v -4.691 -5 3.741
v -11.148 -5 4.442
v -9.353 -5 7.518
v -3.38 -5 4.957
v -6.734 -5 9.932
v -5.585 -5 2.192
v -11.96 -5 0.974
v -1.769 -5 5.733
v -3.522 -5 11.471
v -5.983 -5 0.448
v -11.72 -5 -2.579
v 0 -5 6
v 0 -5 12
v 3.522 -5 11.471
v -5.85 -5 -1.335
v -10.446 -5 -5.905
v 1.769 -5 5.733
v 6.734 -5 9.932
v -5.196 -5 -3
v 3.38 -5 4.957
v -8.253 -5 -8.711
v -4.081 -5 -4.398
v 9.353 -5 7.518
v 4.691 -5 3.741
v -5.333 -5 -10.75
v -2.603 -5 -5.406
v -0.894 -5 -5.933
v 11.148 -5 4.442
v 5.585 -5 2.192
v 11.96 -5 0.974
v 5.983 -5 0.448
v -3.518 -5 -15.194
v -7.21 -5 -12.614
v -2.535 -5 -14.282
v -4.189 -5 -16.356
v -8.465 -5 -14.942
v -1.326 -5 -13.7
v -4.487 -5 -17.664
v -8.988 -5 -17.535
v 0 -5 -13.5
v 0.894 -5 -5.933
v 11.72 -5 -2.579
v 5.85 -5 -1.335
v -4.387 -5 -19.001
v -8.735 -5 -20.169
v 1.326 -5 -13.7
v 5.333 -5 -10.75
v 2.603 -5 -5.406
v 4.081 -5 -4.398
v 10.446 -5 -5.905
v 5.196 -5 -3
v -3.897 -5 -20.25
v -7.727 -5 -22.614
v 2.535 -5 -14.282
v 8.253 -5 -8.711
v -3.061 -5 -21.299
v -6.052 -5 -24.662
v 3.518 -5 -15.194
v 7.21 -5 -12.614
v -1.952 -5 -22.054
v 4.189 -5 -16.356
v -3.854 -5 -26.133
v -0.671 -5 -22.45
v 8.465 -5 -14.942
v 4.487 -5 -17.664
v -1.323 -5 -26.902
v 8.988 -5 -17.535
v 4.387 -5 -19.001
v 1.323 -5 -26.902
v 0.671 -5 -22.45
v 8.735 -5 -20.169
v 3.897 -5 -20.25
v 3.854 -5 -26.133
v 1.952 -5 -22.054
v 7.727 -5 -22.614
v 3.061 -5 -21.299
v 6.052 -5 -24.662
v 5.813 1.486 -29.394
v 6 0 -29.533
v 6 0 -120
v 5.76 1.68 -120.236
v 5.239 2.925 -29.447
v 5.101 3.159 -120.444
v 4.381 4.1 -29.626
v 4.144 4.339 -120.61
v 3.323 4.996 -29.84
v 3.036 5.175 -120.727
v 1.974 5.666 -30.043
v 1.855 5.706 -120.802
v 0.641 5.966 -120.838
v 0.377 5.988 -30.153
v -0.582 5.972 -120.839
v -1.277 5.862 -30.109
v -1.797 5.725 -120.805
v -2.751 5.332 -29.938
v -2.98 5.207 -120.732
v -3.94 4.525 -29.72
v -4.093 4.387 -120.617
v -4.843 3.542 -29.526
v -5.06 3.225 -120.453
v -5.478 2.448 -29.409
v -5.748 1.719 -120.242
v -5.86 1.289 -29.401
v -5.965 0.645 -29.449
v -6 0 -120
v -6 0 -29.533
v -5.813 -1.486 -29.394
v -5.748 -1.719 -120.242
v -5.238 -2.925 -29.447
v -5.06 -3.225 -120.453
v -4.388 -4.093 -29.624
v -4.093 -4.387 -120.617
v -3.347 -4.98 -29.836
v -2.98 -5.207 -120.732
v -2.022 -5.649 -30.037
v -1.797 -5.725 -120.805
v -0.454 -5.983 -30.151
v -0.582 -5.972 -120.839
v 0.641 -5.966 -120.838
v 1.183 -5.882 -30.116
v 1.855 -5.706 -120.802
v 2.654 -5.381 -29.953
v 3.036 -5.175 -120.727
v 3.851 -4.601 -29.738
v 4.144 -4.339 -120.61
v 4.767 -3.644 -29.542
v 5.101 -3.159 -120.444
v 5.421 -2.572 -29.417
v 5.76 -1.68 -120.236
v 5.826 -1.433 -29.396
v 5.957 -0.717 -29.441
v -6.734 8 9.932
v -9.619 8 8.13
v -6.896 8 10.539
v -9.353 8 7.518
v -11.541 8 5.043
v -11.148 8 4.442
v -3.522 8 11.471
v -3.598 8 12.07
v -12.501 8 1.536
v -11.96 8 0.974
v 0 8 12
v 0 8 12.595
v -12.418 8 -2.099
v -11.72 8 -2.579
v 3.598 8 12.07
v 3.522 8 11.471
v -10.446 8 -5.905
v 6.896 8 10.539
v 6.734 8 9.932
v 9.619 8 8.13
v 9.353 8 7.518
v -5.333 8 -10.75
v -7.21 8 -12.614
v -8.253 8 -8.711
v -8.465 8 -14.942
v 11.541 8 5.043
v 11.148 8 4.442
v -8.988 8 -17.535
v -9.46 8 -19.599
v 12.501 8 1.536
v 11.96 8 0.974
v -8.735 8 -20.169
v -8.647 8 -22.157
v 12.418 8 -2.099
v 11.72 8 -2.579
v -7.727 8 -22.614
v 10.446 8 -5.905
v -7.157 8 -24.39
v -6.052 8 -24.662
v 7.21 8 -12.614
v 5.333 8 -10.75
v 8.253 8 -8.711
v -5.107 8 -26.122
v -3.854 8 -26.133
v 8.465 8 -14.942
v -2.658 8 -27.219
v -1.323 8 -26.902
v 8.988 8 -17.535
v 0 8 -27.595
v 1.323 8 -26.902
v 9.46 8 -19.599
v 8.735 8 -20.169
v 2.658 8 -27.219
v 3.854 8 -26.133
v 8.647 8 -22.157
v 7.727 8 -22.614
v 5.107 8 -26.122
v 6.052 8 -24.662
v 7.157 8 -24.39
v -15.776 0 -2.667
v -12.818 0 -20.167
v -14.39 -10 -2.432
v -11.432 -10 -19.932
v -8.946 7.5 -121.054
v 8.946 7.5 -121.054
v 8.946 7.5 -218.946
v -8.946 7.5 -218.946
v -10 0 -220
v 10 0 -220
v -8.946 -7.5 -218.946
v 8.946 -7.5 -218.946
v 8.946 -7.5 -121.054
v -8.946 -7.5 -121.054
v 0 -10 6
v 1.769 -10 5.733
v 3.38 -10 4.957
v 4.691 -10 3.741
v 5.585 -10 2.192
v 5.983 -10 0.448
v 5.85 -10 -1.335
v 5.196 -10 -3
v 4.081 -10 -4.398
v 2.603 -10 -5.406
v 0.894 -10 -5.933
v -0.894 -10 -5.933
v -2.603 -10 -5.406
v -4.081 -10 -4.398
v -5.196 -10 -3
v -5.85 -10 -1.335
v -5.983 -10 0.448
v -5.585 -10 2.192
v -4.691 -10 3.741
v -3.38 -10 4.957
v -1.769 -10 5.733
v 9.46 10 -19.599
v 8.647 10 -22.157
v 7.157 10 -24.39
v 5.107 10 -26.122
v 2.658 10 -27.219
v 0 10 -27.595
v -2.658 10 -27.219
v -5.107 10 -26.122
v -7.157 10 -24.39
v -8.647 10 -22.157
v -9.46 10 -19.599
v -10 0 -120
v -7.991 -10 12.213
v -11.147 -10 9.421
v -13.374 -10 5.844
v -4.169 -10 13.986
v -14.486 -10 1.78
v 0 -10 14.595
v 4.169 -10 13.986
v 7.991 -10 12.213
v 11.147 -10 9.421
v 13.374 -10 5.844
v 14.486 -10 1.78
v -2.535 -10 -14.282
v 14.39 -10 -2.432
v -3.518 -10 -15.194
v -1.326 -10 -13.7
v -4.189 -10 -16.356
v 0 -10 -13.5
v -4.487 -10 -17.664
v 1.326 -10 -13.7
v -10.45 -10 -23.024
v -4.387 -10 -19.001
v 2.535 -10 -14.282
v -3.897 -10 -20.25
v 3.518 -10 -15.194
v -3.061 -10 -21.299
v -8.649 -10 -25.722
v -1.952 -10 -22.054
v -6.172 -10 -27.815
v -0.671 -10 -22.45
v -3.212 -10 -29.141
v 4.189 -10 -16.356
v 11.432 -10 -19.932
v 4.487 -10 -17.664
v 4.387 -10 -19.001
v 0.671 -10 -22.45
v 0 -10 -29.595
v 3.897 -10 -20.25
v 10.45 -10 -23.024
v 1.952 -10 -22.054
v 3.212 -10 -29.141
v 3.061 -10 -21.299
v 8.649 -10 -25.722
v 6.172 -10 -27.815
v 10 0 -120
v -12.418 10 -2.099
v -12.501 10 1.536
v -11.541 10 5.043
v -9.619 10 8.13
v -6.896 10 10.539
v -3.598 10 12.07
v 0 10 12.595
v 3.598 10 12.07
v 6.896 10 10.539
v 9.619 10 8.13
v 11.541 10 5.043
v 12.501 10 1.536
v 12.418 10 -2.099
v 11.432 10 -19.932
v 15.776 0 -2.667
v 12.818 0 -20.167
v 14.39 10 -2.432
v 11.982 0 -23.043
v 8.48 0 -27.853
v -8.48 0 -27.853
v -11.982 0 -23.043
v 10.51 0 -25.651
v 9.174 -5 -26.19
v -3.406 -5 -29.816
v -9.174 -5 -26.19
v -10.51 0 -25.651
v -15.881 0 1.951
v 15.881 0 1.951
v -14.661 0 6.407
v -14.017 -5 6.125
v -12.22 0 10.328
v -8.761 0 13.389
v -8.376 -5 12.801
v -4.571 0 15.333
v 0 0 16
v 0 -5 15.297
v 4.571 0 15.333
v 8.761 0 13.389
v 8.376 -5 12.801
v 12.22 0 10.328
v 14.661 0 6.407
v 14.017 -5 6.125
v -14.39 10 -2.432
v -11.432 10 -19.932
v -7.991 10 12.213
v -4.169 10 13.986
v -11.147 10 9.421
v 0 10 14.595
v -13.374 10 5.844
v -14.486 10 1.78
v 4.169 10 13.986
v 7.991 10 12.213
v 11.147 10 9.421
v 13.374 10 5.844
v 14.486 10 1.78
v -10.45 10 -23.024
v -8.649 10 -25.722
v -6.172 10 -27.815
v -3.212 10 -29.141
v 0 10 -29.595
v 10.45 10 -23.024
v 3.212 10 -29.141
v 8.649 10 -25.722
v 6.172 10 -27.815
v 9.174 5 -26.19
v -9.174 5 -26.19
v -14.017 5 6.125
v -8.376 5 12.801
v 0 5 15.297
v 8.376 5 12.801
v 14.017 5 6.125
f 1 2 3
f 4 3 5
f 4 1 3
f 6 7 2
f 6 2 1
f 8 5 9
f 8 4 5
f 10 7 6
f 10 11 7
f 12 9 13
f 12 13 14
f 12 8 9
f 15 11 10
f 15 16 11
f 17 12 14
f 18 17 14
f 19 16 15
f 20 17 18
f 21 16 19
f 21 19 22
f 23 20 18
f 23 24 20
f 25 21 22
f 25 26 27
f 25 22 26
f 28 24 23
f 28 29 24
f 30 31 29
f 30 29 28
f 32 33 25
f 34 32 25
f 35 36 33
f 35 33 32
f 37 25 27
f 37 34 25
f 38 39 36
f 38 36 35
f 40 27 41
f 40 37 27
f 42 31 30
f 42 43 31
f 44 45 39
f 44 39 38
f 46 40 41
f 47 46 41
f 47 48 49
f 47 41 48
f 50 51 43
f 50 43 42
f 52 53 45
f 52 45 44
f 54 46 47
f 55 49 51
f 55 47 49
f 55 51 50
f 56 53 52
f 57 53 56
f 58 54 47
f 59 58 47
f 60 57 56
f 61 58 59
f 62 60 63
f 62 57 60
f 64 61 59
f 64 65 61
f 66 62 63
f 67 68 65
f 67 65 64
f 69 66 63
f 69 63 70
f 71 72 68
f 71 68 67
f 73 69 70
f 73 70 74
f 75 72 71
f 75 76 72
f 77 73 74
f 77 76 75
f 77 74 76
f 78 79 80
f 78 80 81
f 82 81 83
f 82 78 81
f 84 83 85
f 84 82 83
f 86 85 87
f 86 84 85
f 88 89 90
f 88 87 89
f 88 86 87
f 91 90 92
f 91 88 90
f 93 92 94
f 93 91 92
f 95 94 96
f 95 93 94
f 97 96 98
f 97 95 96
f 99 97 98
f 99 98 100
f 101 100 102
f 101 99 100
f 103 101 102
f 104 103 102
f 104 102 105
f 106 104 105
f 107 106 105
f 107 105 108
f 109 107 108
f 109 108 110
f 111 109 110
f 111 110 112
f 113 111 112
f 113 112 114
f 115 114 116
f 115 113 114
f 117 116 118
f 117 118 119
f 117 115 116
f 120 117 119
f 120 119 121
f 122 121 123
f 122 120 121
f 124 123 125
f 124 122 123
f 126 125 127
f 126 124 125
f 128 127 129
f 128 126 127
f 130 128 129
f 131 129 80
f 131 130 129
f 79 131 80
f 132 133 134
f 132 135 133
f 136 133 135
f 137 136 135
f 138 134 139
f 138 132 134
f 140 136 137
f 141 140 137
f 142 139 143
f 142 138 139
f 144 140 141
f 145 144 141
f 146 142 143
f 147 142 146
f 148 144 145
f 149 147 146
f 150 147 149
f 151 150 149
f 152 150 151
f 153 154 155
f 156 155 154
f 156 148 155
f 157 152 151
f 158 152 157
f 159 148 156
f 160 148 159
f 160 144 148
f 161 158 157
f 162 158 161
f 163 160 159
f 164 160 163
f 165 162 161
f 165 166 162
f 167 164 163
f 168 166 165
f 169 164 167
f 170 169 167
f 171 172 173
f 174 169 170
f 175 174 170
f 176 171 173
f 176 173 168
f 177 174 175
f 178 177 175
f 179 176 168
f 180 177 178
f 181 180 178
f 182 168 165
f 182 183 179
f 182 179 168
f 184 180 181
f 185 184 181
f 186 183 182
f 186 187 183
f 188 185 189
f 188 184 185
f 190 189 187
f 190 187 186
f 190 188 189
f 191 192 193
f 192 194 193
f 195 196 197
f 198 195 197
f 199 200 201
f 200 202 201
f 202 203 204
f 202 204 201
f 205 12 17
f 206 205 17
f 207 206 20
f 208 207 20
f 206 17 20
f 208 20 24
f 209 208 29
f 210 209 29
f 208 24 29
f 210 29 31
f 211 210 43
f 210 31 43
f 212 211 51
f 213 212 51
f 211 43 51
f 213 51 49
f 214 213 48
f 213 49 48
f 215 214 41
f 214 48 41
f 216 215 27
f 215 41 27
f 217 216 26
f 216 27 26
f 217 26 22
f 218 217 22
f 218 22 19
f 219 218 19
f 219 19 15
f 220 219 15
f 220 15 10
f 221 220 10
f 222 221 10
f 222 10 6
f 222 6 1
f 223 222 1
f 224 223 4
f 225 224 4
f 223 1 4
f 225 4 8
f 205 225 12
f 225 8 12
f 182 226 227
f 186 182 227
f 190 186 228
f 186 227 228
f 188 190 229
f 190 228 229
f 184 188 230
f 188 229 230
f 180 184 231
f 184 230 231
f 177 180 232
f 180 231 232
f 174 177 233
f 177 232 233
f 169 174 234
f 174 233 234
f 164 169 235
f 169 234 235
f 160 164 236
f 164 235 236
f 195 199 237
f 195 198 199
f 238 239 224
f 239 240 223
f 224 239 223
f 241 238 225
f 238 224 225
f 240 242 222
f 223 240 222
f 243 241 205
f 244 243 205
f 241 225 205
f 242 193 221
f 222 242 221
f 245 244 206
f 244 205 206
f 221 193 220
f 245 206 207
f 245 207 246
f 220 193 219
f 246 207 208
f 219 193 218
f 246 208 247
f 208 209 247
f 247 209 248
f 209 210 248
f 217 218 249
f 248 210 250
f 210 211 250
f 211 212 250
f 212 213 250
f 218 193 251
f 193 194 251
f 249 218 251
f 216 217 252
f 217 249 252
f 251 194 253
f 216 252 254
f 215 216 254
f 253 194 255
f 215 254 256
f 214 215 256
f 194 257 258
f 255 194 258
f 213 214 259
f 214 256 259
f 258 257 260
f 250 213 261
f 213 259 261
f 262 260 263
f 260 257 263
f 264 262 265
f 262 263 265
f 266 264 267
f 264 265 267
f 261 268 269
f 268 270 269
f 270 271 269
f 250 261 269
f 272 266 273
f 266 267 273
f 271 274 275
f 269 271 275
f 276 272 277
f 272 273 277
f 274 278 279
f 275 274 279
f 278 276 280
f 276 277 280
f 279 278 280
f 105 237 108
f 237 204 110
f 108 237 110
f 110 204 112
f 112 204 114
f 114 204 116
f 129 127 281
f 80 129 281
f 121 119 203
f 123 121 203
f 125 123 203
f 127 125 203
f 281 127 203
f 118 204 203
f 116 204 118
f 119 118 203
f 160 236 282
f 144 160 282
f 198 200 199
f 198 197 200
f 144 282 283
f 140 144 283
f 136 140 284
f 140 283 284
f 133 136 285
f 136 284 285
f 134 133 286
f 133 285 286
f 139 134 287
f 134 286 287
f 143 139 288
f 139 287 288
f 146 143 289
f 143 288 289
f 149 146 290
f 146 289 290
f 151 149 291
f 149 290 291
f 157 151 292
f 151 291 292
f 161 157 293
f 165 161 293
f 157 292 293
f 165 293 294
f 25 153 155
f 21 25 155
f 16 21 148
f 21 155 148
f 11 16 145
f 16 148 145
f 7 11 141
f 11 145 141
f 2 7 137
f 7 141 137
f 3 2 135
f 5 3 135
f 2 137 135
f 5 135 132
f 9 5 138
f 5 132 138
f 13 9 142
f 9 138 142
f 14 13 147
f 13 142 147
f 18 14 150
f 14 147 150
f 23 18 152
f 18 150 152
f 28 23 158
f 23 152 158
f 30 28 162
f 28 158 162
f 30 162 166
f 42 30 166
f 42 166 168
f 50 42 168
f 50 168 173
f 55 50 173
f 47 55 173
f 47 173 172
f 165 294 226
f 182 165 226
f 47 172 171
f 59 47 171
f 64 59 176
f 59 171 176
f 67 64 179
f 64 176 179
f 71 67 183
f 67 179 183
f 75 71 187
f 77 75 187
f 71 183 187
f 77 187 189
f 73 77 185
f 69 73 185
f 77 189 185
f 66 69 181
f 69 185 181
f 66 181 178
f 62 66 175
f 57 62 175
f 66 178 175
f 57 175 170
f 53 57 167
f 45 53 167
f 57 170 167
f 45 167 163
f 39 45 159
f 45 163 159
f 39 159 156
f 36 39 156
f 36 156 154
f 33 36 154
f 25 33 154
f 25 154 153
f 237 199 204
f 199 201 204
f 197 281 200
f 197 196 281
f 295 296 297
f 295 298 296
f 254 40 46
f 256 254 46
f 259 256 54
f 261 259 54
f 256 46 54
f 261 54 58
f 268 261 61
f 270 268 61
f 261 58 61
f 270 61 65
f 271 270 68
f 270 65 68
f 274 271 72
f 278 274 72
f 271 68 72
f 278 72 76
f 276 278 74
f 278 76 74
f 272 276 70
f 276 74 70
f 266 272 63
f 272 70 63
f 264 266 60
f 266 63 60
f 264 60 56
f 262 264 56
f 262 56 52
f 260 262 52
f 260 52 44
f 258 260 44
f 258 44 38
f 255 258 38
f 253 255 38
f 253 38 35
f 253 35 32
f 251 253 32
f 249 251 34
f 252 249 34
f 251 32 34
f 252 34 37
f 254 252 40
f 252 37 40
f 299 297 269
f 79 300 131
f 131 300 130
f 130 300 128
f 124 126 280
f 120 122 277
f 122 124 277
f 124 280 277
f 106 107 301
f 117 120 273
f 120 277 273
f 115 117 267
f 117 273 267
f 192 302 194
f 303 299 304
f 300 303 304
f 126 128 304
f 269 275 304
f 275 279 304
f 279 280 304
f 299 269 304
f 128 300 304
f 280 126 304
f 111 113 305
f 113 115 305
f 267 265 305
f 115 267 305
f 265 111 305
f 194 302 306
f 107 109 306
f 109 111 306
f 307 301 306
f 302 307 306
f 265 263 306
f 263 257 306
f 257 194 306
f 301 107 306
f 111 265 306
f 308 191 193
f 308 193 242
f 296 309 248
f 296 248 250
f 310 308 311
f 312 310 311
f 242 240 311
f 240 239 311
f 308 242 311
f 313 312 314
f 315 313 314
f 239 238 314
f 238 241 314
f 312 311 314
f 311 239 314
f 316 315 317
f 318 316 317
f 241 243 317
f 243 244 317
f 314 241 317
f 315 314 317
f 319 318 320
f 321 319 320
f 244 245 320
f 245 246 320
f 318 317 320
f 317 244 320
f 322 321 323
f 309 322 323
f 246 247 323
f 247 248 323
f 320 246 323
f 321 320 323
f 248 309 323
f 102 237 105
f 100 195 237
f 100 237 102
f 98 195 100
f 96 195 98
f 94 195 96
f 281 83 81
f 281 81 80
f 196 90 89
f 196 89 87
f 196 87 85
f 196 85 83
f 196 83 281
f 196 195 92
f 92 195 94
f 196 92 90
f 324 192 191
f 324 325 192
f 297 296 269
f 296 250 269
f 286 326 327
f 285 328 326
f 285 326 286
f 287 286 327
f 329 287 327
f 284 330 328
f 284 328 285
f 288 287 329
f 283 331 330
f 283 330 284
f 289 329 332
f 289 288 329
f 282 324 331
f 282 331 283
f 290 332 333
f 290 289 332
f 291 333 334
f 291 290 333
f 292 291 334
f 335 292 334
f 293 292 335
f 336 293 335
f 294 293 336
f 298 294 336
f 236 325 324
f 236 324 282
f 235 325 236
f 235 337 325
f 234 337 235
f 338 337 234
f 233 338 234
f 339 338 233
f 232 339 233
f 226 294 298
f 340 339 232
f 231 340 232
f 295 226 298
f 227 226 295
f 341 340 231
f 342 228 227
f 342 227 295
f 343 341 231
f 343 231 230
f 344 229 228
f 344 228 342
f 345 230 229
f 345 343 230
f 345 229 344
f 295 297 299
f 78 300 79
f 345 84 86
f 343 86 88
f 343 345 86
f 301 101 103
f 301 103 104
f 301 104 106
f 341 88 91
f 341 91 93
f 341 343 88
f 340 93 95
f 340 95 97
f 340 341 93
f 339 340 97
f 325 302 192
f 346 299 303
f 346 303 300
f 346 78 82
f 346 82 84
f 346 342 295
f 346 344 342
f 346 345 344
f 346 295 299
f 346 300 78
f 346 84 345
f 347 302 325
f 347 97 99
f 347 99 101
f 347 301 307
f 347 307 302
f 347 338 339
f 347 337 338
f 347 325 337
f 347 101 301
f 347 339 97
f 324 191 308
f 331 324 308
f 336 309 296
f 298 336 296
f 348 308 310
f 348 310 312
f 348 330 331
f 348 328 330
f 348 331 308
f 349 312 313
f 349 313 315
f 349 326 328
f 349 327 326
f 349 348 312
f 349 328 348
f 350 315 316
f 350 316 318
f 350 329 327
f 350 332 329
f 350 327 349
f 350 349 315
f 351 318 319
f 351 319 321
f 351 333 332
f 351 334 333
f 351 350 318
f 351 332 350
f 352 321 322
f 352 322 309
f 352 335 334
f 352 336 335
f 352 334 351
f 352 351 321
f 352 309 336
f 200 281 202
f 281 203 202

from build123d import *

# Parameters (mm, degrees)
CROQUIS1_W                        = 20
CROQUIS1_H                        = 100
MANGO_DEPTH                       = 7.5
MANGO_TAPER                       = 8
MANGO_OTHER_WAY_DEPTH             = 7.5
MANGO_OTHER_WAY_TAPER             = 8
TRANSICION_REACH                  = 222.355
CROQUIS2_R                        = 6
SALIENTE_EXTRUIR3_DEPTH           = 10
SALIENTE_EXTRUIR3_TAPER           = 8
SALIENTE_EXTRUIR3_OTHER_WAY_DEPTH = 10
SALIENTE_EXTRUIR3_OTHER_WAY_TAPER = 8
CORTAR_EXTRUIR1_DEPTH             = 2
CORTAR_EXTRUIR2_DEPTH             = 13
CROQUIS6_R                        = 4.5
CORTAR_EXTRUIR3_DEPTH             = 5
CROQUIS7_R                        = 6
CORTAR_EXTRUIR4_DEPTH             = 5


with BuildPart() as part:
    # Croquis1 → Mango (new body)
    with BuildSketch(Plane(origin=(0, 0, 0), x_dir=(1, 0, 0), z_dir=(0, 1, 0))):
        with Locations((0, 170)):
            Rectangle(CROQUIS1_W, CROQUIS1_H)
    extrude(amount=MANGO_DEPTH, taper=MANGO_TAPER)

    # Croquis1 → Mango other way (add)
    with BuildSketch(Plane(origin=(0, 0, 0), x_dir=(1, 0, 0), z_dir=(0, 1, 0))):
        with Locations((0, 170)):
            Rectangle(CROQUIS1_W, CROQUIS1_H)
    extrude(amount=-MANGO_OTHER_WAY_DEPTH, taper=MANGO_OTHER_WAY_TAPER)

    # Croquis2 → Transicion (add, up to next)
    with BuildSketch(Plane.XY, mode=Mode.PRIVATE) as transicion_sk1:
        Circle(CROQUIS2_R)
    transicion_tool1 = extrude(transicion_sk1.sketch, amount=-TRANSICION_REACH, mode=Mode.PRIVATE) - part.part
    add(transicion_tool1.solids().sort_by_distance((0, 0, 0))[0])

    # Croquis3 → Saliente-Extruir3 (add)
    with BuildSketch(Plane(origin=(0, 0, 0), x_dir=(1, 0, 0), z_dir=(0, 1, 0))):
        with BuildLine():
            ThreePointArc((12.818172863, 20.166666667), (0, 31), (-12.818172863, 20.166666667))
            Line((-12.818172863, 20.166666667), (-15.776212755, 2.666666667))
            ThreePointArc((-15.776212755, 2.666666667), (0, -16), (15.776212755, 2.666666667))
            Line((15.776212755, 2.666666667), (12.818172863, 20.166666667))
        make_face()
    extrude(amount=SALIENTE_EXTRUIR3_DEPTH, taper=SALIENTE_EXTRUIR3_TAPER)

    # Croquis3 → Saliente-Extruir3 other way (add)
    with BuildSketch(Plane(origin=(0, 0, 0), x_dir=(1, 0, 0), z_dir=(0, 1, 0))):
        with BuildLine():
            ThreePointArc((12.818172863, 20.166666667), (0, 31), (-12.818172863, 20.166666667))
            Line((-12.818172863, 20.166666667), (-15.776212755, 2.666666667))
            ThreePointArc((-15.776212755, 2.666666667), (0, -16), (15.776212755, 2.666666667))
            Line((15.776212755, 2.666666667), (12.818172863, 20.166666667))
        make_face()
    extrude(amount=-SALIENTE_EXTRUIR3_OTHER_WAY_DEPTH, taper=SALIENTE_EXTRUIR3_OTHER_WAY_TAPER)

    # Croquis4 → Cortar-Extruir1 (cut)
    with BuildSketch(Plane(origin=(0, 10, 0), x_dir=(1, 0, 0), z_dir=(0, 1, 0))):
        with BuildLine():
            Line((-9.460394951, 19.599098609), (-12.418434842, 2.099098609))
            ThreePointArc((-12.418434842, 2.099098609), (0, -12.594591653), (12.418434842, 2.099098609))
            Line((12.418434842, 2.099098609), (9.460394951, 19.599098609))
            ThreePointArc((9.460394951, 19.599098609), (0, 27.594591653), (-9.460394951, 19.599098609))
        make_face()
    extrude(amount=-CORTAR_EXTRUIR1_DEPTH, mode=Mode.SUBTRACT)

    # Croquis5 → Cortar-Extruir2 (cut)
    with BuildSketch(Plane(origin=(0, 8, 0), x_dir=(1, 0, 0), z_dir=(0, 1, 0))):
        with BuildLine():
            ThreePointArc((5.332682252, 10.75), (0, 27), (-5.332682252, 10.75))
            ThreePointArc((-5.332682252, 10.75), (0, -12), (5.332682252, 10.75))
        make_face()
    extrude(amount=-CORTAR_EXTRUIR2_DEPTH, mode=Mode.SUBTRACT)

    # Croquis6 → Cortar-Extruir3 (cut)
    with BuildSketch(Plane(origin=(0, -5, 0), x_dir=(1, 0, 0), z_dir=(0, 1, 0))):
        with Locations(Location((0, 18, 0), (0, 0, 270))):
            Circle(CROQUIS6_R)
    extrude(amount=-CORTAR_EXTRUIR3_DEPTH, mode=Mode.SUBTRACT)

    # Croquis7 → Cortar-Extruir4 (cut)
    with BuildSketch(Plane(origin=(0, -5, 0), x_dir=(1, 0, 0), z_dir=(0, 1, 0))):
        with Locations(Location((0, 0, 0), (0, 0, 270))):
            Circle(CROQUIS7_R)
    extrude(amount=-CORTAR_EXTRUIR4_DEPTH, mode=Mode.SUBTRACT)


solid = part.part
